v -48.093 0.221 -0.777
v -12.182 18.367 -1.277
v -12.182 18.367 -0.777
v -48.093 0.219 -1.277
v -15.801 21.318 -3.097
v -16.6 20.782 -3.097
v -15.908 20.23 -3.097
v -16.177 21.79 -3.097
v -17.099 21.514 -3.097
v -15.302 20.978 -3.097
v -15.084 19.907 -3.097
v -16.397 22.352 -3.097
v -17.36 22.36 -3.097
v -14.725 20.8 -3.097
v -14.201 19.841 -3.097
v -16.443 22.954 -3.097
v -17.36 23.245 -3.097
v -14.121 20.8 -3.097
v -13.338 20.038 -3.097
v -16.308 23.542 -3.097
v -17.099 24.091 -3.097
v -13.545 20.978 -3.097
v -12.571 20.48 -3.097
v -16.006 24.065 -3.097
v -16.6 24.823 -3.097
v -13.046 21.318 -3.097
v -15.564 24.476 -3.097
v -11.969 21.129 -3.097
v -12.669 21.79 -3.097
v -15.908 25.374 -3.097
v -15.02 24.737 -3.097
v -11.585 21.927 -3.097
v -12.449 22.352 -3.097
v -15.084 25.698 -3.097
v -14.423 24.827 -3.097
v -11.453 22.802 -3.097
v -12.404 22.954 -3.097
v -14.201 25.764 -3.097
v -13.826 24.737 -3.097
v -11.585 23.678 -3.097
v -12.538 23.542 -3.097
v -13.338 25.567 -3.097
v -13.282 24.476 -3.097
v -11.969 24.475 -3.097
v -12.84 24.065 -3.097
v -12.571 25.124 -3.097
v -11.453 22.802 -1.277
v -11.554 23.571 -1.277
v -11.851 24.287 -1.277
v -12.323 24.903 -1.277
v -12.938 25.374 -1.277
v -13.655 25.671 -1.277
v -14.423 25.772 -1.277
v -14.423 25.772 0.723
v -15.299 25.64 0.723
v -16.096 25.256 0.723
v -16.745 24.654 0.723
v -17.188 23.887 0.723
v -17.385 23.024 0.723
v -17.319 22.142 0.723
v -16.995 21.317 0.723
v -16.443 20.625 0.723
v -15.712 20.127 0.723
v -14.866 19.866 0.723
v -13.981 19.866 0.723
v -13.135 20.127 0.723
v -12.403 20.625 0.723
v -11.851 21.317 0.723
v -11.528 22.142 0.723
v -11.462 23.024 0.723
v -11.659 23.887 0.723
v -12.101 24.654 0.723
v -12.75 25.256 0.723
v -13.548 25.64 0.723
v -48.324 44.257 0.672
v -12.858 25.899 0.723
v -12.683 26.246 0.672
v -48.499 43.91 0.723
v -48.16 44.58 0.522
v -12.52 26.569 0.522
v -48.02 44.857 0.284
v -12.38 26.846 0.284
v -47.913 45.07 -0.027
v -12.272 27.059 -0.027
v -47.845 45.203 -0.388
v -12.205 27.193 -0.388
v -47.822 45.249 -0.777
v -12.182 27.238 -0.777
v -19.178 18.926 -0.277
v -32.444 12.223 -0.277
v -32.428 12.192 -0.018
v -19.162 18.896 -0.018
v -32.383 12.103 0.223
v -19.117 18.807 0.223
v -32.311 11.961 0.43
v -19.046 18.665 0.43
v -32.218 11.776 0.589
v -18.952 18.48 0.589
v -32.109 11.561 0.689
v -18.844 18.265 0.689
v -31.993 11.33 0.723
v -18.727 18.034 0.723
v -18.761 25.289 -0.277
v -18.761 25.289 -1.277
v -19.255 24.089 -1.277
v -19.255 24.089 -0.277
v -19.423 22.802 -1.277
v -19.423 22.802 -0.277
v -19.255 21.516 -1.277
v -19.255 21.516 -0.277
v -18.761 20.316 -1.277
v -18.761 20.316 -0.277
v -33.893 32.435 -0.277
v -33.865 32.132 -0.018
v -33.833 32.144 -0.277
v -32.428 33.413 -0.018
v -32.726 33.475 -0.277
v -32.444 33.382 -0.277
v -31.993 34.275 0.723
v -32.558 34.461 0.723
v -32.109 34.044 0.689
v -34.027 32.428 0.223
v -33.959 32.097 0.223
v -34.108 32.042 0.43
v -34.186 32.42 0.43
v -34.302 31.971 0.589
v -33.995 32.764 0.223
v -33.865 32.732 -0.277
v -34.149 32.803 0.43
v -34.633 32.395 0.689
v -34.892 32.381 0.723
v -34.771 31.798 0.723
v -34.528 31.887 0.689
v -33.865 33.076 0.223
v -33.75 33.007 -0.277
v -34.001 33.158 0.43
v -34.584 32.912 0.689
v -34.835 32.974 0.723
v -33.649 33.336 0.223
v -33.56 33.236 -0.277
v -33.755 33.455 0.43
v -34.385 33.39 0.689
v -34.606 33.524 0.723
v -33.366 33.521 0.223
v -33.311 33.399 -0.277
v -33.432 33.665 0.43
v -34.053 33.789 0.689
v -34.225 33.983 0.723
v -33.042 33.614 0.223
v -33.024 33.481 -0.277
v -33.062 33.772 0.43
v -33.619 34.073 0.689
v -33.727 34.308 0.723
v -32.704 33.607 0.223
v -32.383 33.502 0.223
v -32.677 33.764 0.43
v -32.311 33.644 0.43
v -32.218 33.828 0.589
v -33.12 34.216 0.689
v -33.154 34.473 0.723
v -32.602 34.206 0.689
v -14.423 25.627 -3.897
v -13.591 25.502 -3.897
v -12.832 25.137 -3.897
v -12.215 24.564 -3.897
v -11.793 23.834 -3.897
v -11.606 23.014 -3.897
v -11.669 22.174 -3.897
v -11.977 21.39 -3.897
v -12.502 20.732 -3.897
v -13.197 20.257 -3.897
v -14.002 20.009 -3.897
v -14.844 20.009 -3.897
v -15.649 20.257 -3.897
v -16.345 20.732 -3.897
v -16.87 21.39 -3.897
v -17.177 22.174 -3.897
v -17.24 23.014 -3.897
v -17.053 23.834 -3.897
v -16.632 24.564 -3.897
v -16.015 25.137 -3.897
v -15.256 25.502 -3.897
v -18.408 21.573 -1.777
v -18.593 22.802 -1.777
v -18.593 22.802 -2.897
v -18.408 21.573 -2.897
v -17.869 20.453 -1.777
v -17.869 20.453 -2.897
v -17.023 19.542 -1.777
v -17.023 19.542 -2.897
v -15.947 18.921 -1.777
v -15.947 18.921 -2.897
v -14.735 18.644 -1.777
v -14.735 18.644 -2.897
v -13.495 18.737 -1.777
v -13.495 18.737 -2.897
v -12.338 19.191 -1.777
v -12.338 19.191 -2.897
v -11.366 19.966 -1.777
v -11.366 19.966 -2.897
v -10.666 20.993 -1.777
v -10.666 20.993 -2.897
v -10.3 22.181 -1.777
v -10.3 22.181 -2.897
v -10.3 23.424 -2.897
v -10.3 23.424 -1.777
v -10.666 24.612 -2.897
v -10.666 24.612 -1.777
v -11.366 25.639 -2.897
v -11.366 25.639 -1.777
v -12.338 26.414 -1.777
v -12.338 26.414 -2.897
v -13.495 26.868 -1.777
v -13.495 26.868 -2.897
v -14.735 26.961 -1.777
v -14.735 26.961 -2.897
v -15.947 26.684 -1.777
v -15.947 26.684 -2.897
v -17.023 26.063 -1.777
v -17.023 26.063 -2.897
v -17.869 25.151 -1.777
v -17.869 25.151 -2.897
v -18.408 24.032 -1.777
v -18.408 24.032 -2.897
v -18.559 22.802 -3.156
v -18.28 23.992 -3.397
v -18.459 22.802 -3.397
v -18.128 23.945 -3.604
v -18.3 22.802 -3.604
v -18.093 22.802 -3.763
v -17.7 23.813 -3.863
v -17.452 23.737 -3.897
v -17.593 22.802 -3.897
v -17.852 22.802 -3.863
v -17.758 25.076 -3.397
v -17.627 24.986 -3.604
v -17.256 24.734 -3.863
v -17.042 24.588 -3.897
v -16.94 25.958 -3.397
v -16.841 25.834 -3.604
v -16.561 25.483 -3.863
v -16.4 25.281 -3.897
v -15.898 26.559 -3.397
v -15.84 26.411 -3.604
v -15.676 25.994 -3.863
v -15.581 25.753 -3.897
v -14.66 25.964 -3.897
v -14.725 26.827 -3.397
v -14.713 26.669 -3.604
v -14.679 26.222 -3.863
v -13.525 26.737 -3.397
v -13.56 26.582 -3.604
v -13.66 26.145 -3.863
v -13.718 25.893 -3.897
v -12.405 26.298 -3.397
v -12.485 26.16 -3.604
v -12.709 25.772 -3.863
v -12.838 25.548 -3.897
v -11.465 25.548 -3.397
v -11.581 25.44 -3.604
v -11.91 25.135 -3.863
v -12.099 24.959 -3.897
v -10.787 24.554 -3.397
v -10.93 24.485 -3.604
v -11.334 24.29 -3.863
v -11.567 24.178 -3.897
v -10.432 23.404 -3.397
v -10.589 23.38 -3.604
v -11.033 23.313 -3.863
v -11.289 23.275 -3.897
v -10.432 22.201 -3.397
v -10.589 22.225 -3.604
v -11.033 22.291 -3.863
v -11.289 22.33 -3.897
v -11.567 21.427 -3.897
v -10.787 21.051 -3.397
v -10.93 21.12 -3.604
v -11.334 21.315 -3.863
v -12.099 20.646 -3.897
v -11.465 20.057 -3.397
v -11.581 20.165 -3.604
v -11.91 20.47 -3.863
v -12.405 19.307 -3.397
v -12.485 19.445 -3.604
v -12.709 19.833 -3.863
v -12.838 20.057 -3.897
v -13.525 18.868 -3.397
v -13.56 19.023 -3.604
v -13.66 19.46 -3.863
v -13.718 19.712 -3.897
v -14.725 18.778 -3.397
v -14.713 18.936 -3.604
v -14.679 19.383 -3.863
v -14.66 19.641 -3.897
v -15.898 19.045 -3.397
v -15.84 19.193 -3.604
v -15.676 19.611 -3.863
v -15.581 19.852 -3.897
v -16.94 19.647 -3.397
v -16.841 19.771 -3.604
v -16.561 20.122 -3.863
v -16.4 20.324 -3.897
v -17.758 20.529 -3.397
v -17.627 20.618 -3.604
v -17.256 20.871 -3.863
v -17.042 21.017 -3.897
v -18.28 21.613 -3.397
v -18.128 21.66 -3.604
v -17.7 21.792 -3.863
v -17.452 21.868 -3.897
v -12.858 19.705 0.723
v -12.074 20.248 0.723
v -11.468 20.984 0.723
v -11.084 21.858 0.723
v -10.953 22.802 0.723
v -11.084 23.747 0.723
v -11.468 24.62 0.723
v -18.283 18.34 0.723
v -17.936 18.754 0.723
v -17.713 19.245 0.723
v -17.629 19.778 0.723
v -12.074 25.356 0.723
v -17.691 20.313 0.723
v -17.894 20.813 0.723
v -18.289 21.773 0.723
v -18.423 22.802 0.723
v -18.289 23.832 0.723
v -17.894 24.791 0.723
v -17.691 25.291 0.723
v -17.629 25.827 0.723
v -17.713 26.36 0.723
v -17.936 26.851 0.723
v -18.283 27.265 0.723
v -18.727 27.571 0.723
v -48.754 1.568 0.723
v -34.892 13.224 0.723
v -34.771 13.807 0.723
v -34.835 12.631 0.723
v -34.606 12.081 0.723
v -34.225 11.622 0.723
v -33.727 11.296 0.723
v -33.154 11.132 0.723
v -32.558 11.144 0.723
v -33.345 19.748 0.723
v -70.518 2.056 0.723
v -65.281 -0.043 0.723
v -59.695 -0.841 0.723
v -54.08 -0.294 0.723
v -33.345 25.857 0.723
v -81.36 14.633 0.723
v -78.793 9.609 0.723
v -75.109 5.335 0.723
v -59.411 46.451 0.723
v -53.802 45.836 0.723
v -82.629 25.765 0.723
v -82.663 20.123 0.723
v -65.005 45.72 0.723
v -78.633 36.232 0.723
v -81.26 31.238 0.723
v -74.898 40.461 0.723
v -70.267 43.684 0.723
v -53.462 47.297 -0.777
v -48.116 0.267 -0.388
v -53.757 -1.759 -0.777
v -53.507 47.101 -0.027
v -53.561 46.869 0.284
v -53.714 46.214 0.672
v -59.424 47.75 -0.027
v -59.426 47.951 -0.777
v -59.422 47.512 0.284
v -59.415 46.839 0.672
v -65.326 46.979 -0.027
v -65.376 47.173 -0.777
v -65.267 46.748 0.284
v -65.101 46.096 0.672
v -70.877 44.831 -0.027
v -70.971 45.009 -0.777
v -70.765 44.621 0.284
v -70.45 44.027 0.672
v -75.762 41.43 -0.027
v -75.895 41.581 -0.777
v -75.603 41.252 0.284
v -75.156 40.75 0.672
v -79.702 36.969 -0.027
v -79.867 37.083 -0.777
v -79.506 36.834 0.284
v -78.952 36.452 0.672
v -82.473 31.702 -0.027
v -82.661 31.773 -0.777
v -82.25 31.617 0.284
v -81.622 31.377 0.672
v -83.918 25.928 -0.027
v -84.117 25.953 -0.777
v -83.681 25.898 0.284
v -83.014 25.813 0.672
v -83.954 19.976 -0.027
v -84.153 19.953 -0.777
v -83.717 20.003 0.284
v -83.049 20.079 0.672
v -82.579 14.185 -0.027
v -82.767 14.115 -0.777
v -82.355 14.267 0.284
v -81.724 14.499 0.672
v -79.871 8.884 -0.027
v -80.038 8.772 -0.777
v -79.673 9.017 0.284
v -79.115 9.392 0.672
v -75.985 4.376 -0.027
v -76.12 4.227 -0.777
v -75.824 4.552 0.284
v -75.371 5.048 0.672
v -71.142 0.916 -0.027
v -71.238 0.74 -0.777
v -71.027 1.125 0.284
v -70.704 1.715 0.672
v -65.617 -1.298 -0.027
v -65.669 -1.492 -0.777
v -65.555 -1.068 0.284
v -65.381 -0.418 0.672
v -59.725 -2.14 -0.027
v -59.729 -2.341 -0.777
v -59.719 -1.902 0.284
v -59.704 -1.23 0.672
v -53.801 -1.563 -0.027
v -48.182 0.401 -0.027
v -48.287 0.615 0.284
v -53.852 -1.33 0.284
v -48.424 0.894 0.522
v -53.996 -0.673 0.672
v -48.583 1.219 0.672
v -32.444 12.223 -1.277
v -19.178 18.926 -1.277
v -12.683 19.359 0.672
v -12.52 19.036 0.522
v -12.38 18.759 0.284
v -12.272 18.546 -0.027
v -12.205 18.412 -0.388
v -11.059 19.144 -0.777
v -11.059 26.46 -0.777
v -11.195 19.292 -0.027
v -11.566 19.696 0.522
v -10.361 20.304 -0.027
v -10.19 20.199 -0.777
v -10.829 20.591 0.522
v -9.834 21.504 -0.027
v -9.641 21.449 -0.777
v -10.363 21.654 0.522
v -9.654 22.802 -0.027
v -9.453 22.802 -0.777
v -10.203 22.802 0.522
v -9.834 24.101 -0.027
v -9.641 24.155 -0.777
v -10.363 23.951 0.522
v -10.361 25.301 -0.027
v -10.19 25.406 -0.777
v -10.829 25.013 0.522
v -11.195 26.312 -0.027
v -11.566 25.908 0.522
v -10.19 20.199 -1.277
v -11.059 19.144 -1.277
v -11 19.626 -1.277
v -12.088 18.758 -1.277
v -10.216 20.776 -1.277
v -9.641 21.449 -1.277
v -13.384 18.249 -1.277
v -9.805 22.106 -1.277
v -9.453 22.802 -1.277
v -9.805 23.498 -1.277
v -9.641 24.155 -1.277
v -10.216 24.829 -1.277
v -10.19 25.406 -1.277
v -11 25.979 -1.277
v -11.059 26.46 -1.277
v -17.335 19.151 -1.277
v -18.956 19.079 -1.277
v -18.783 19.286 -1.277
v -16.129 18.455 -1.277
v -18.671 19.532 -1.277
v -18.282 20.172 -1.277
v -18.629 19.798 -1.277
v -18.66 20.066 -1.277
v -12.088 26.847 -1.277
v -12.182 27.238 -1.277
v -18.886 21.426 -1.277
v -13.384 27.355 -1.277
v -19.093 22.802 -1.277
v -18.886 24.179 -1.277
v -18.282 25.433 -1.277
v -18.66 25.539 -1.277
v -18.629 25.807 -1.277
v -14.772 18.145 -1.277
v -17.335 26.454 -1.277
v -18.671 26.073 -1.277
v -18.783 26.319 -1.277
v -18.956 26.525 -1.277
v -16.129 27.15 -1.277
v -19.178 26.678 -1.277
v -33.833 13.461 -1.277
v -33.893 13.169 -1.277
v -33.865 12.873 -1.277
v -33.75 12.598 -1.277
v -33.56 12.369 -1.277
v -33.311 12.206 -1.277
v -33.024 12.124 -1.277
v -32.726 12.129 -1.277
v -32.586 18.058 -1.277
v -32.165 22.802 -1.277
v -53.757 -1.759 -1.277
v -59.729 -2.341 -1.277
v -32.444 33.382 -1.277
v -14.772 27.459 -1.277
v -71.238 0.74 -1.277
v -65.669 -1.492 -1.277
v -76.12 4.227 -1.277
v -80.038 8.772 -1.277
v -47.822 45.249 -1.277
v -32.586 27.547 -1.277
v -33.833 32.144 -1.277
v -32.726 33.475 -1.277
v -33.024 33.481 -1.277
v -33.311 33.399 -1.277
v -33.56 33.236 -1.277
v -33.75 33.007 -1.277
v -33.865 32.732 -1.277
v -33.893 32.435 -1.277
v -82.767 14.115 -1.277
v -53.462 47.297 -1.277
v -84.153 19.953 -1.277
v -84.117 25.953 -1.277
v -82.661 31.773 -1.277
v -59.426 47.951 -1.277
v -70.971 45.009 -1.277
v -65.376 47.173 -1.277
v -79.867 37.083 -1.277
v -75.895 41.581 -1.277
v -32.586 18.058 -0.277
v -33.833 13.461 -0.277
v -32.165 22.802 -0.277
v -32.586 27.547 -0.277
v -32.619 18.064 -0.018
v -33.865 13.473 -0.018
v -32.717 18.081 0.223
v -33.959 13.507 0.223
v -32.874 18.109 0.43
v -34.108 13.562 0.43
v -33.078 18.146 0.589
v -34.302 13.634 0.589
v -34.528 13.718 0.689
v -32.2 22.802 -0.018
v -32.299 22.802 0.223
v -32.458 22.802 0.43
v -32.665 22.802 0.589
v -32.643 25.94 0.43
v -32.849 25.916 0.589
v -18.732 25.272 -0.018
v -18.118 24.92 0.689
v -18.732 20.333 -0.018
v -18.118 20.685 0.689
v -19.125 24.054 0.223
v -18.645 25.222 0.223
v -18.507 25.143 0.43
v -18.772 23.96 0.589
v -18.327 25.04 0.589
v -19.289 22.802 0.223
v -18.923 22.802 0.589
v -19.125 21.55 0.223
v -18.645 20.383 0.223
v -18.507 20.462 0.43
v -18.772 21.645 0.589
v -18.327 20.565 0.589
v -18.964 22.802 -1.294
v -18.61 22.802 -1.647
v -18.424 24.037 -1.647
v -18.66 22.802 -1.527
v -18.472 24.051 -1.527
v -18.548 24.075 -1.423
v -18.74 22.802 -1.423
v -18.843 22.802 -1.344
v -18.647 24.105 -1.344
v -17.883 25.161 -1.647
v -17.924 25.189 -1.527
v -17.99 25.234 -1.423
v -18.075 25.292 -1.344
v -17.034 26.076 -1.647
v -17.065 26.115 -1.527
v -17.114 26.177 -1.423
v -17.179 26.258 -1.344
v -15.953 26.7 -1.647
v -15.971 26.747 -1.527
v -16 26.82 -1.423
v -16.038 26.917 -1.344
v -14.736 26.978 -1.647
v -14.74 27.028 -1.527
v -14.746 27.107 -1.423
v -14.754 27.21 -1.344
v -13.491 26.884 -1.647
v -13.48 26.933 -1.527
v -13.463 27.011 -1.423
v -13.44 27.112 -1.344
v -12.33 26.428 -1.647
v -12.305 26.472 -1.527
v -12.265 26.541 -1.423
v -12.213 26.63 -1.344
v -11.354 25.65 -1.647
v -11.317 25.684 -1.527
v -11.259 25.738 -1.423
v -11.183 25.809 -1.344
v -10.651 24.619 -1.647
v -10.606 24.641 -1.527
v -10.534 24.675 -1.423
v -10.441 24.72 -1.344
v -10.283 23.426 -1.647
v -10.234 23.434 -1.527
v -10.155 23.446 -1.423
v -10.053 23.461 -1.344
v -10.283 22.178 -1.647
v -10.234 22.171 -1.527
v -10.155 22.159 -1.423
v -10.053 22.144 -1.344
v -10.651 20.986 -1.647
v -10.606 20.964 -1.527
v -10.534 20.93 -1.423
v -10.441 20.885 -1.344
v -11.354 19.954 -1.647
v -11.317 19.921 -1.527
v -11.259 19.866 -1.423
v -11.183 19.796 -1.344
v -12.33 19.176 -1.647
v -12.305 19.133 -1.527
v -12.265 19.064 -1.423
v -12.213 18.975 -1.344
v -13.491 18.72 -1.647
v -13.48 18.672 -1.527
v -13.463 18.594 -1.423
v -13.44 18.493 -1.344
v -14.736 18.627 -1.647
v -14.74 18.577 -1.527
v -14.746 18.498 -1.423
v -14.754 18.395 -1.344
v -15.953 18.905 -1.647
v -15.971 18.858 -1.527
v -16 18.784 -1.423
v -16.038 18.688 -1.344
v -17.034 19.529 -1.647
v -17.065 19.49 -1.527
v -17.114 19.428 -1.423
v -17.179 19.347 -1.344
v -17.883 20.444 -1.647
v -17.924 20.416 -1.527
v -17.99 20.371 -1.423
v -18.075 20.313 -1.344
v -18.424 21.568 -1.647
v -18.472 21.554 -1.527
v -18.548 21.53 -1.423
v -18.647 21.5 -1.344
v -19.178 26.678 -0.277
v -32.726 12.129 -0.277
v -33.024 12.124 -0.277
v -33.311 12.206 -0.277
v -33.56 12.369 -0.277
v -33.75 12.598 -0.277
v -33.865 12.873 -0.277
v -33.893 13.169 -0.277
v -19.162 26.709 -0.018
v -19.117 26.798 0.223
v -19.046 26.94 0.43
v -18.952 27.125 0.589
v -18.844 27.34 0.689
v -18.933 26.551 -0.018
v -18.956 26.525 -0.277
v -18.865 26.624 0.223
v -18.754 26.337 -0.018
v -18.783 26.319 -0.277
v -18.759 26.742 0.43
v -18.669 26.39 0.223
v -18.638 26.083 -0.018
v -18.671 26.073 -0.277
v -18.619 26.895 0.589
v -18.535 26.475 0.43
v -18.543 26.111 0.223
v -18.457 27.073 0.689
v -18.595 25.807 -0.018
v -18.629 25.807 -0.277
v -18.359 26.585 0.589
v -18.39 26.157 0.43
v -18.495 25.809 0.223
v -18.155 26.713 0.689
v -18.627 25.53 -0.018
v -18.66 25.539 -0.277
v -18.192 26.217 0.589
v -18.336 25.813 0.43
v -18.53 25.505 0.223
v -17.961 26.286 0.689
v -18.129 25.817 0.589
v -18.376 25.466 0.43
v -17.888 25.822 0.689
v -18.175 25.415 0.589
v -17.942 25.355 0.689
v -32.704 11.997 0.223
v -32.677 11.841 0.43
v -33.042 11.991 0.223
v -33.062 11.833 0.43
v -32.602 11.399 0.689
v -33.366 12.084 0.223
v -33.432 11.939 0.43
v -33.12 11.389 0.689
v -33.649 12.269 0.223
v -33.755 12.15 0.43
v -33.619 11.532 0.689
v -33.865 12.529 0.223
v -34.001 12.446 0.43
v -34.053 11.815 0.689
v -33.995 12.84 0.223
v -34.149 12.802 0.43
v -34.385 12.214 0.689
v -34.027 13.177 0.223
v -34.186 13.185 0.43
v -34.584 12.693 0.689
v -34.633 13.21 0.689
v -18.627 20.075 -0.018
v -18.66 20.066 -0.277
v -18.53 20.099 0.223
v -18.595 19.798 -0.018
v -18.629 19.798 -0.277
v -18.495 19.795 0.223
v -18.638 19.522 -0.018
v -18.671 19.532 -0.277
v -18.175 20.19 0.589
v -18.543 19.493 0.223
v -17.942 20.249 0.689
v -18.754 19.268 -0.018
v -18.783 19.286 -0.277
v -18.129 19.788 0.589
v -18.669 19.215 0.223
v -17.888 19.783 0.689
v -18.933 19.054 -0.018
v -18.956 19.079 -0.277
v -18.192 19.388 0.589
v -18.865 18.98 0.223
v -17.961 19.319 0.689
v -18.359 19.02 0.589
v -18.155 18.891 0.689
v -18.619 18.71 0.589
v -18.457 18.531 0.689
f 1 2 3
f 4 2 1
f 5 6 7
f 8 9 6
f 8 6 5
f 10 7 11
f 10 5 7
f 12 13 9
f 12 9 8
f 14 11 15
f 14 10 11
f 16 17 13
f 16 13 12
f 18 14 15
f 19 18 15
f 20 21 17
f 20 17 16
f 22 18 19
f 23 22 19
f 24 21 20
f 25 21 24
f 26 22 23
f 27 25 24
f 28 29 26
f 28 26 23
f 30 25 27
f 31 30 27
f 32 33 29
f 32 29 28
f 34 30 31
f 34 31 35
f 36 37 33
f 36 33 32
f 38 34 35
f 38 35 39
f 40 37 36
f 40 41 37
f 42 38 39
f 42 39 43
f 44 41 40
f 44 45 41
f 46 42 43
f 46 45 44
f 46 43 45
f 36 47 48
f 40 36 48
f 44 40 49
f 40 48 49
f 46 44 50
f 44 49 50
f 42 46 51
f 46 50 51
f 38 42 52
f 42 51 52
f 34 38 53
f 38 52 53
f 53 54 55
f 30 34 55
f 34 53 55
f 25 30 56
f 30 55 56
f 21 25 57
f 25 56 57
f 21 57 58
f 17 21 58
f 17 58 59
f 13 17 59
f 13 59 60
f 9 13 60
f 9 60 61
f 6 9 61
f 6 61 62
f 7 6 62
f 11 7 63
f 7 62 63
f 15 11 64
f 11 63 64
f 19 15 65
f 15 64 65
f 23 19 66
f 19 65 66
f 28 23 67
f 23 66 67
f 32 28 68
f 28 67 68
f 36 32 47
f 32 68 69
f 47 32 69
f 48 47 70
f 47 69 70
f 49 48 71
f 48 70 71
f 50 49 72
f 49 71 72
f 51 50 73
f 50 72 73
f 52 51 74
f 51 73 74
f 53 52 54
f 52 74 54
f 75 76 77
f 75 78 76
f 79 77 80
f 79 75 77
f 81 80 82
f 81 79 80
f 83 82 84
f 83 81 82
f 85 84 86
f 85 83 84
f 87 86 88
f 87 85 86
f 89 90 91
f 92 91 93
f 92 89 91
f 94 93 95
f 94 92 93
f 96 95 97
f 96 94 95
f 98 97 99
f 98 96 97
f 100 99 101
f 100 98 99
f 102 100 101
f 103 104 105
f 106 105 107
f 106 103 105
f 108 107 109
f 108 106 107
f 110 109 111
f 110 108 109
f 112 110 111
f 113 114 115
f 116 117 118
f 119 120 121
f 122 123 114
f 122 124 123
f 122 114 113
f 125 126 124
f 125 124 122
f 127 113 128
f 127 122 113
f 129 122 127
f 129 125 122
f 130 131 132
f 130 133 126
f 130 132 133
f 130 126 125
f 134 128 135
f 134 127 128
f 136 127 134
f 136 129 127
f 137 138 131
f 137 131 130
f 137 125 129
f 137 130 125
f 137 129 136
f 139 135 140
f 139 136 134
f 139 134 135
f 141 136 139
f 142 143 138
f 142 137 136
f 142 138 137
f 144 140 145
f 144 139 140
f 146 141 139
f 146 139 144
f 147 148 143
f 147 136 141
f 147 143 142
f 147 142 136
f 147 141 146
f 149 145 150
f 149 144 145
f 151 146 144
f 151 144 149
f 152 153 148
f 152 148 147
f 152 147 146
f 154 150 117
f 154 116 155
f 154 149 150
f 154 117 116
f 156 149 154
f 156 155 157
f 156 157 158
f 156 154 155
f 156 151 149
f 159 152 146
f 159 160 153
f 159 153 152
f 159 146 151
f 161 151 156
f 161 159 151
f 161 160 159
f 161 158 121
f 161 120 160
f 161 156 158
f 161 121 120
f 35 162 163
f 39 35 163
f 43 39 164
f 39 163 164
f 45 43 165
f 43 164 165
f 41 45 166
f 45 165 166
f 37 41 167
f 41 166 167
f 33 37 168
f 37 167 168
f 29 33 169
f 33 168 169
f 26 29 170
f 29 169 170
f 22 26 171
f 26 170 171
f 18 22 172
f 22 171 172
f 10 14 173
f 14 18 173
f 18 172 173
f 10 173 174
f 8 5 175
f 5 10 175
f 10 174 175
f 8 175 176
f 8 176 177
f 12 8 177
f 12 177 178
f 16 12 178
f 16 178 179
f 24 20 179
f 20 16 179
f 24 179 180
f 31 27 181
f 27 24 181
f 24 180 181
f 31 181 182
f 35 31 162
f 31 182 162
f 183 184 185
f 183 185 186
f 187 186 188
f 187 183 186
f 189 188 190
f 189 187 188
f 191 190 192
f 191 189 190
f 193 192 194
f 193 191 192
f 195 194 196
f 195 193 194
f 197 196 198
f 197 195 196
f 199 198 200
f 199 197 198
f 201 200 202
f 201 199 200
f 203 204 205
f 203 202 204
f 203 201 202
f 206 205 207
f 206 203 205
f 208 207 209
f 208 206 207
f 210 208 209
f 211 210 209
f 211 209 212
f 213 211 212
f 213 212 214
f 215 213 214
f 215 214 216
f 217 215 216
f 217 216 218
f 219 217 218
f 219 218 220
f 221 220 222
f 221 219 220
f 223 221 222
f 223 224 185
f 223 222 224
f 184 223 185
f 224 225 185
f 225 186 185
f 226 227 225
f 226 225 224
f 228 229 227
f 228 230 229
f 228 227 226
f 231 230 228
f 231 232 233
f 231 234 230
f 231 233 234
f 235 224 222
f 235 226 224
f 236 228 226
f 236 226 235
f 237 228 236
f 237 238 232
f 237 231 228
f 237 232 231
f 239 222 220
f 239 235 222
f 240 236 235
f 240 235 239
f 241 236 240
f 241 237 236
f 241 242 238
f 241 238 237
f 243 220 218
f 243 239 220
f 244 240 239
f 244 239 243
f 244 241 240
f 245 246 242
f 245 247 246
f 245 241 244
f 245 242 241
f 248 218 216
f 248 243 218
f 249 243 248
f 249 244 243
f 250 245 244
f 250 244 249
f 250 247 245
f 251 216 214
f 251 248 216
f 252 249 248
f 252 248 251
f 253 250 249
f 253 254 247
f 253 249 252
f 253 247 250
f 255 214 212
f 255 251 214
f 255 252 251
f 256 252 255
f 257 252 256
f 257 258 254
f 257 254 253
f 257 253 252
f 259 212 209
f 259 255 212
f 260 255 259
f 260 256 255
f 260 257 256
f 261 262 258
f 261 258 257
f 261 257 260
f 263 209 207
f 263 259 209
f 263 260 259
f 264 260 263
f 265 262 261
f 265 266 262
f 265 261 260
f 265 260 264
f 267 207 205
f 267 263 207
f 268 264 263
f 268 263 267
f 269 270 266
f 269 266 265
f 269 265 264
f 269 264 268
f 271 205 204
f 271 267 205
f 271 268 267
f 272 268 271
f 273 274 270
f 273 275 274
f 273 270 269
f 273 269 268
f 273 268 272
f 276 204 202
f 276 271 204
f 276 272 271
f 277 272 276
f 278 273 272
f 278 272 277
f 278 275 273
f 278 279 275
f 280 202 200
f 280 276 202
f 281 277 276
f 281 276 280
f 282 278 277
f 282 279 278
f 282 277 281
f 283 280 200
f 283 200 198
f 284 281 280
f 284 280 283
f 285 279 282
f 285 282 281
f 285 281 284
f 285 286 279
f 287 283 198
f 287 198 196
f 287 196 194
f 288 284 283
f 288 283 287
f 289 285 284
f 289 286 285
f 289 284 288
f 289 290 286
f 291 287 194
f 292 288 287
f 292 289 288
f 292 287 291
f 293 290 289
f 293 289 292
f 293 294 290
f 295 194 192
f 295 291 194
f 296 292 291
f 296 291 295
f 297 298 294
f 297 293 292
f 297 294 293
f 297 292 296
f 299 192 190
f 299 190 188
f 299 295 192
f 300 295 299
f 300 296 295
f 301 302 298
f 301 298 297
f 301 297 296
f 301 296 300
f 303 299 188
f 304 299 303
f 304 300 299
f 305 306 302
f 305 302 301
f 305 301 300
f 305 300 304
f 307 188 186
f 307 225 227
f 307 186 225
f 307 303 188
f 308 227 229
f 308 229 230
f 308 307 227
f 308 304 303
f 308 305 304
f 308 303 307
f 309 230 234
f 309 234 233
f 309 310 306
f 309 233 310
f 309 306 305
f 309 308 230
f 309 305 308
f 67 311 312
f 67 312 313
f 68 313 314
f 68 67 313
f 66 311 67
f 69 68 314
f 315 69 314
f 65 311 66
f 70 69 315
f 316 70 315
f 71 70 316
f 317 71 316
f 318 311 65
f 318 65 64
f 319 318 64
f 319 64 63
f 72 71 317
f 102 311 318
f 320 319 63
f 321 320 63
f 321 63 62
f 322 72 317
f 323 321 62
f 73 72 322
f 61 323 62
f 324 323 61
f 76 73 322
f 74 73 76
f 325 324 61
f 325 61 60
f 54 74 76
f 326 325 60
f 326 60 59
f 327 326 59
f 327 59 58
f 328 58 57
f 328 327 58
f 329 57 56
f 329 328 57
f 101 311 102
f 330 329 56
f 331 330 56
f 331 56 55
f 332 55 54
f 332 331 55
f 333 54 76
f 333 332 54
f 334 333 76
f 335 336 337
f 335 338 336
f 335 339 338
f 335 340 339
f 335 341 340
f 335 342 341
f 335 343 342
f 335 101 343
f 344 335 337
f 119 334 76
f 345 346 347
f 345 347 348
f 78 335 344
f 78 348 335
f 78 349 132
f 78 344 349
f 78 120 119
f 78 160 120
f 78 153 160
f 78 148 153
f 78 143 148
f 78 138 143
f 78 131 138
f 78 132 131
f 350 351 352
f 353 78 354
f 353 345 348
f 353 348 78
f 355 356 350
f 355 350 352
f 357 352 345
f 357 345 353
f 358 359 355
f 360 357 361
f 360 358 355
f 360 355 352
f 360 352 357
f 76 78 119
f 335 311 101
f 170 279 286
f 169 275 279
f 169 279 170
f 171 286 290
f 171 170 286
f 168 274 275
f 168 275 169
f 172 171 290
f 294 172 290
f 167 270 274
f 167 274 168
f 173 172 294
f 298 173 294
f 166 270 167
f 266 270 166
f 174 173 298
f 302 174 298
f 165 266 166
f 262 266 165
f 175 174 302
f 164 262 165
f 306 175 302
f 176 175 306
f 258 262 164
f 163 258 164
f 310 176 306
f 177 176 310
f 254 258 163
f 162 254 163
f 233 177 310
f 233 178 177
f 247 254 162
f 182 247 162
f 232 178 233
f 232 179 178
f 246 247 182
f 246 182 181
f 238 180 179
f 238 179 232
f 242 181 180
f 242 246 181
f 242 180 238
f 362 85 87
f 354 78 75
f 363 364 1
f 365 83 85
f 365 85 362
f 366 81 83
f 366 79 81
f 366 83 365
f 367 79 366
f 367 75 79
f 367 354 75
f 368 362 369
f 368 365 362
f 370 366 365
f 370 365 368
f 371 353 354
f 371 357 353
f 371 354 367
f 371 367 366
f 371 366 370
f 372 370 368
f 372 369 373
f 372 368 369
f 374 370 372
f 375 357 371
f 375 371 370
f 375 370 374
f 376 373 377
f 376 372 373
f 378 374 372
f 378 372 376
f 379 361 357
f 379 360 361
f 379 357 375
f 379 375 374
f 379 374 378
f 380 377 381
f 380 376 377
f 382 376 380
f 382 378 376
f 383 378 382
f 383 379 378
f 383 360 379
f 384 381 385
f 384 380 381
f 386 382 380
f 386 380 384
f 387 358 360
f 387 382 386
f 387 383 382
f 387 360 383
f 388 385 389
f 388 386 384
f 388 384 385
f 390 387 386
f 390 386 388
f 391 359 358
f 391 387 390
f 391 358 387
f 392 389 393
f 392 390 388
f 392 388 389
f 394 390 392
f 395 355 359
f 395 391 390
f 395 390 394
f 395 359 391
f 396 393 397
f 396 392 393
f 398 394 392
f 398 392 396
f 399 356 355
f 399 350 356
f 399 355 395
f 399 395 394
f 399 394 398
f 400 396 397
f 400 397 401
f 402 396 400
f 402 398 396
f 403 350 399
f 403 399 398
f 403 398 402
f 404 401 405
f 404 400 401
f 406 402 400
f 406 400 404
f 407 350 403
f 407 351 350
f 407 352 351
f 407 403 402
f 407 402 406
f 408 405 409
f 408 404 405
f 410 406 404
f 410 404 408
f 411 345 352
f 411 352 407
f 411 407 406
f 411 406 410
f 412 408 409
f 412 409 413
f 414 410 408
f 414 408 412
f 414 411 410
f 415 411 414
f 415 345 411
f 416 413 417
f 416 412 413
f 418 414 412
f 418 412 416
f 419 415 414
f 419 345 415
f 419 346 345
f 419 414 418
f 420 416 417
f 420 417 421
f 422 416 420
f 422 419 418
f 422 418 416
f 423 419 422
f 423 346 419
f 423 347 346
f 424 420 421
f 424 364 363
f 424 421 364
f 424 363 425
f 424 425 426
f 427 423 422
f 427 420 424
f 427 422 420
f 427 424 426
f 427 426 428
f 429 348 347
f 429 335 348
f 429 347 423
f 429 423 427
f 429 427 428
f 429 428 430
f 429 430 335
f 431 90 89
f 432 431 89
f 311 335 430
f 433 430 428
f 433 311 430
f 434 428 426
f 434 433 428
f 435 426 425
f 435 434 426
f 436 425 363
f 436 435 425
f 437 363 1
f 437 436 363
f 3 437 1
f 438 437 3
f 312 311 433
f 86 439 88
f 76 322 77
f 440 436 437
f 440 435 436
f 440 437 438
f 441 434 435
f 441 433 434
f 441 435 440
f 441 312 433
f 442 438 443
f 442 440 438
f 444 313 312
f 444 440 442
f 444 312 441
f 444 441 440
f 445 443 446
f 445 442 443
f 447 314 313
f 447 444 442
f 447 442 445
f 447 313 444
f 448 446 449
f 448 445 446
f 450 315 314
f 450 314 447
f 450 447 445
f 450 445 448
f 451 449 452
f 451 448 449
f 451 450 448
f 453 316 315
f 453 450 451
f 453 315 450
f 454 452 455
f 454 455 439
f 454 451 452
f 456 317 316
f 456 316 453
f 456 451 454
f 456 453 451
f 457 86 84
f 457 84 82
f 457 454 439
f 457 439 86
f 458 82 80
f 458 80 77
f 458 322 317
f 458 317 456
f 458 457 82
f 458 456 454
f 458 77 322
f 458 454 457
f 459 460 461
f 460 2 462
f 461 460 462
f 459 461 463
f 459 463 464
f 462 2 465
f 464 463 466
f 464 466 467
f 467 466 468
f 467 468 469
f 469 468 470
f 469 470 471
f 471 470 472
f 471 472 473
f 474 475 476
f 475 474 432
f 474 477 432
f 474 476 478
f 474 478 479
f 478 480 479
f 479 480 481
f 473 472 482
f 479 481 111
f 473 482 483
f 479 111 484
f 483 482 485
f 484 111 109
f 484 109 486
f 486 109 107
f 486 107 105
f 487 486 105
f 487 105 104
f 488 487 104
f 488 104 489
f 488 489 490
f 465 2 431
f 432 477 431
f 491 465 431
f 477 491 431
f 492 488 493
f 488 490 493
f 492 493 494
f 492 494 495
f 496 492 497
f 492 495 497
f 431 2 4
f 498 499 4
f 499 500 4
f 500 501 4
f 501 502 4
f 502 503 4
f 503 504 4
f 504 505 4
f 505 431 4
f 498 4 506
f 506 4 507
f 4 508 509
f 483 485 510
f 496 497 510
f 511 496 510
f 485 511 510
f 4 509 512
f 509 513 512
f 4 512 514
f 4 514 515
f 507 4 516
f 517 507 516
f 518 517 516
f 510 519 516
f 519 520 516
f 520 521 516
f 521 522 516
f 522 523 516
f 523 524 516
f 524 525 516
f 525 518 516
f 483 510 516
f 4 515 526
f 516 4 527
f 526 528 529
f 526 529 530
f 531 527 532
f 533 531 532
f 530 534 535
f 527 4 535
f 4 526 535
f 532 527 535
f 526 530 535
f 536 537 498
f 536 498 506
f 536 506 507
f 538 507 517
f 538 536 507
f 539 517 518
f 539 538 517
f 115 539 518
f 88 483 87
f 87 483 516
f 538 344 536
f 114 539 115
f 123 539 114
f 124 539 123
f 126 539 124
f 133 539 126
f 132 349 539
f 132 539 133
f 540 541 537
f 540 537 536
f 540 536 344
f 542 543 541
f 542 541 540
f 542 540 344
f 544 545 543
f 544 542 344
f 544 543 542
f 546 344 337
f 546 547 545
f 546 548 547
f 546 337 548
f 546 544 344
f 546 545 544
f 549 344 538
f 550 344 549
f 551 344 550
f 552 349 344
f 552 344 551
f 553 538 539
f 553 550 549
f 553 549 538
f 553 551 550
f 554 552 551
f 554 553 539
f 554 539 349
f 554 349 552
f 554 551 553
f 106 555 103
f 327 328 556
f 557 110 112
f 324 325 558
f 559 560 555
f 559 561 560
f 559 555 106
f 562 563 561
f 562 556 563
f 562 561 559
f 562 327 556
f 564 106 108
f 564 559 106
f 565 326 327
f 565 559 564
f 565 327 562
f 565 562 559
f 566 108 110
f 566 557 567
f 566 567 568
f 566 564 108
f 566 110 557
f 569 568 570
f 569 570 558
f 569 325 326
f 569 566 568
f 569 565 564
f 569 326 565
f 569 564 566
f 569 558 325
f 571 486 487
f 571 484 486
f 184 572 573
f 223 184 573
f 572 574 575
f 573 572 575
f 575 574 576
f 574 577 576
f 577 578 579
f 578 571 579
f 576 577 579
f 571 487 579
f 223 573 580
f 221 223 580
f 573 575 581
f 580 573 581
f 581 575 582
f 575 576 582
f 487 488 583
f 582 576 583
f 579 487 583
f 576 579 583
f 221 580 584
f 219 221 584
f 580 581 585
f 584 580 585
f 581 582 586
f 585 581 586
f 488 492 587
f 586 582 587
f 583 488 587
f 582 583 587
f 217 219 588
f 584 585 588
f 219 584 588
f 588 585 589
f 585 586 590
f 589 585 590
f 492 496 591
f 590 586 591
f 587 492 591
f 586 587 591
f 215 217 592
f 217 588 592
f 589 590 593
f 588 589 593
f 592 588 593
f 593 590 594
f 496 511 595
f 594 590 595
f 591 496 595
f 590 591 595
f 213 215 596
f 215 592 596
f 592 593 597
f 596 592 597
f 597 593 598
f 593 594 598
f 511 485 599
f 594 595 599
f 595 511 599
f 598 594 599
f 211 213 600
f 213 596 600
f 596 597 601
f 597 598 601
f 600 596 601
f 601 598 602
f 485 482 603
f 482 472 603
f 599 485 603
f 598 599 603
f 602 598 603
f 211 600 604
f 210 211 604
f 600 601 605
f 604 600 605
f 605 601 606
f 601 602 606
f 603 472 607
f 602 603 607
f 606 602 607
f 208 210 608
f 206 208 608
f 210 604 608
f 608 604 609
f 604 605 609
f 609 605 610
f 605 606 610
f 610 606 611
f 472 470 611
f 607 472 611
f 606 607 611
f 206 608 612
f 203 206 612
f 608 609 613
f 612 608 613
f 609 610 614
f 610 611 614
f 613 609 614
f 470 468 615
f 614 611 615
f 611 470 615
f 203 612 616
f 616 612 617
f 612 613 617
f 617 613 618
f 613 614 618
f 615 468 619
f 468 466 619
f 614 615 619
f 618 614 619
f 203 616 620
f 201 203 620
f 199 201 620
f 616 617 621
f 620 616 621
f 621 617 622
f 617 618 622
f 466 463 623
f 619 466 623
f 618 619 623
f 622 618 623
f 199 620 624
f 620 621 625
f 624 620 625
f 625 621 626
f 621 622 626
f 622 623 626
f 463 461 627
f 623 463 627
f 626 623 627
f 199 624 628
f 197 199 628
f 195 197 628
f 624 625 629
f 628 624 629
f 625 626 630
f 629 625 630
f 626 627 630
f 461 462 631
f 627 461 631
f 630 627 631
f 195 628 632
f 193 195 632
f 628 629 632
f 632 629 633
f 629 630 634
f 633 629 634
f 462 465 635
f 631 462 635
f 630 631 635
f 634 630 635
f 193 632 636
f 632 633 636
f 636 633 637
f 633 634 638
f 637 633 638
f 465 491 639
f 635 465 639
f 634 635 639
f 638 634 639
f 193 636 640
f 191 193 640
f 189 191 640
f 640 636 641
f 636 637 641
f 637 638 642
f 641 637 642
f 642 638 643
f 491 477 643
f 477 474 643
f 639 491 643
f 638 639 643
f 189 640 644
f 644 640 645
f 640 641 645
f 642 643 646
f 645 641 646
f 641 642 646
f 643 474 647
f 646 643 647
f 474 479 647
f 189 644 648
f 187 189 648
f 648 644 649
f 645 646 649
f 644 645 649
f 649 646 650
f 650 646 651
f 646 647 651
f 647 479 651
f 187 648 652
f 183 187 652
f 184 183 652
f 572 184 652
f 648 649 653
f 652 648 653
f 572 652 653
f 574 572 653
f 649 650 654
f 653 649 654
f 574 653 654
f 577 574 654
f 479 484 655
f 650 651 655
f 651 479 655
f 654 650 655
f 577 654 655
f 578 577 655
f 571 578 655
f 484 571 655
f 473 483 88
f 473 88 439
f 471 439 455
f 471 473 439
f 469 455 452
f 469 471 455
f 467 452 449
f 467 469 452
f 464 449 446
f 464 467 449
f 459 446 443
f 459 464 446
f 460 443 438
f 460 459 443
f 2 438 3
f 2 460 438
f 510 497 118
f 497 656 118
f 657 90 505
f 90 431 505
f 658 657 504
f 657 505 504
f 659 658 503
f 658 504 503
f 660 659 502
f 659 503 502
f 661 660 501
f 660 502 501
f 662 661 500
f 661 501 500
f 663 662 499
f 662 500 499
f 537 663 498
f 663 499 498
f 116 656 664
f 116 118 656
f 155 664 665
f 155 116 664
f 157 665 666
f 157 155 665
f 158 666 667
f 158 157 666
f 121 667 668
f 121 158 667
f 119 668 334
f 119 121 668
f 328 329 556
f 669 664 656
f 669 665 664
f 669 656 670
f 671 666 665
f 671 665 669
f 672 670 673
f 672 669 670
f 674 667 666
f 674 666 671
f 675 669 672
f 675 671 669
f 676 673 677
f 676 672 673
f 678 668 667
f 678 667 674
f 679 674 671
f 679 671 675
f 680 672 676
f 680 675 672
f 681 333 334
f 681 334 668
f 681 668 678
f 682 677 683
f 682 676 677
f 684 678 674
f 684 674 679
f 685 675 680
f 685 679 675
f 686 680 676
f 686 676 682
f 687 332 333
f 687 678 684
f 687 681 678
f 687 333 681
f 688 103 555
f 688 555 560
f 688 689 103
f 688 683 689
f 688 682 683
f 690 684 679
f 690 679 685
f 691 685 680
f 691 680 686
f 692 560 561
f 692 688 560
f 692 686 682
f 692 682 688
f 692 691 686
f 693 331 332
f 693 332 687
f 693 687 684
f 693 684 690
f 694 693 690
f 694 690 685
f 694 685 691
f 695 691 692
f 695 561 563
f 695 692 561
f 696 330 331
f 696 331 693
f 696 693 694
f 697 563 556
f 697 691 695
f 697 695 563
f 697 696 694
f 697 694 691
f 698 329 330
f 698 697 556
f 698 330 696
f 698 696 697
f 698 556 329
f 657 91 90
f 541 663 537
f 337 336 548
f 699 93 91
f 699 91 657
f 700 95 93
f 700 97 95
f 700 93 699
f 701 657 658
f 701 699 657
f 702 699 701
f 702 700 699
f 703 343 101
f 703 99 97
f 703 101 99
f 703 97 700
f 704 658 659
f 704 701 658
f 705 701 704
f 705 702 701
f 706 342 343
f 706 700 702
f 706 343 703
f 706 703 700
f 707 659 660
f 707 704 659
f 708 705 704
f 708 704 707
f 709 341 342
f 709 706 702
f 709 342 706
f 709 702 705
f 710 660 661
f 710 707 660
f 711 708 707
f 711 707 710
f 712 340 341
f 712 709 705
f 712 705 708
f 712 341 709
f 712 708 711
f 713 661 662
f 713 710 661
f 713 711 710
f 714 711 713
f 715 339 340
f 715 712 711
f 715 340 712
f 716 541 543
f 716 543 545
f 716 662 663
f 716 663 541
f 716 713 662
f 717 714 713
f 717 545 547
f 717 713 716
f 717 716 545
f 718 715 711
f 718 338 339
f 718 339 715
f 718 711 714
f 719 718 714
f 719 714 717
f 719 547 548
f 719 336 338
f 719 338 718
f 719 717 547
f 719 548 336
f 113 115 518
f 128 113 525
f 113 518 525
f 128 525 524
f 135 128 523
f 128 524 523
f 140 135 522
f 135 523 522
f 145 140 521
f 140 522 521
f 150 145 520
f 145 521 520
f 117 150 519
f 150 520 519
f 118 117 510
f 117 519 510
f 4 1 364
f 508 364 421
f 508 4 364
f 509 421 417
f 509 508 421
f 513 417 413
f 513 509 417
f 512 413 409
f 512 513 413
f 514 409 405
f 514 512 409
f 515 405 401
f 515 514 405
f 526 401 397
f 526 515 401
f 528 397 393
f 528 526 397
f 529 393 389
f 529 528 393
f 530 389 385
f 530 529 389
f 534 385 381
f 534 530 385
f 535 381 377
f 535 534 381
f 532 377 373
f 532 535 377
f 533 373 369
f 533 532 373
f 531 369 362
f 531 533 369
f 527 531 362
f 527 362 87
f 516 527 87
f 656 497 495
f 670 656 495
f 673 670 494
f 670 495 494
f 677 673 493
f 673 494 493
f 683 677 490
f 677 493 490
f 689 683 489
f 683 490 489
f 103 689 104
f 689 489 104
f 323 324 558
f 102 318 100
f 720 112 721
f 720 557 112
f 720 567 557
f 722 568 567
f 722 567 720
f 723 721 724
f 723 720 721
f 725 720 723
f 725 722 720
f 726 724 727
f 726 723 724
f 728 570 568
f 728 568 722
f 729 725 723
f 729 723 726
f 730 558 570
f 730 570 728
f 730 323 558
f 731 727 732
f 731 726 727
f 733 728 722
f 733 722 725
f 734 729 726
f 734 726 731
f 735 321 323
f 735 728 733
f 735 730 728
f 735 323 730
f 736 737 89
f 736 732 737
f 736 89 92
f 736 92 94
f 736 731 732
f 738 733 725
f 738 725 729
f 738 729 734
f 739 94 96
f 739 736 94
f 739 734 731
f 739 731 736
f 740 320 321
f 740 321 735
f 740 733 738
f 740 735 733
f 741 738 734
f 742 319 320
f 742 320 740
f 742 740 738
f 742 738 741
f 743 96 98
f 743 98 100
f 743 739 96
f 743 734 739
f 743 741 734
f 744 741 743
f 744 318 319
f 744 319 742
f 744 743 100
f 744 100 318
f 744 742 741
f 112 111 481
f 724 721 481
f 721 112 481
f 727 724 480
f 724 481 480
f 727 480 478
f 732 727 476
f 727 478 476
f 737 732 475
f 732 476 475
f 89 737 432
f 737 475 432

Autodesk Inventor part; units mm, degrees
ref_plane "YZ Plane" through (0, 0, 0) normal (1, 0, 0) x (0, 1, 0)
ref_plane "XZ Plane" through (0, 0, 0) normal (0, 1, 0) x (-1, 0, 0)
ref_plane "XY Plane" through (0, 0, 0) normal (0, 0, 1) x (1, 0, 0)
ref_plane "Work Plane1" through (0, 0, 0) normal (0, 0, -1) x (-1, 0, 0)
ref_plane "Work Plane3" through (-59.1654, 22.8024, -1.2767) normal (0, 0, 1) x (0, 1, 0)
sketch "Sketch4" plane through (-59.1654, 22.8024, -1.2767) normal (0, 0, 1) x (0, 1, 0)
  line L0 (0, 0.2578) -> (0, -48.4285) construction
  line L1 (-4.3051, -44.7422) -> (4.9106, -44.7422) construction
  circle A0 centre (0, -44.7422) radius 2.97
  circle A1 centre (0, 0) radius 25.1499 construction
  arc A2 (-4.4358, -46.9838) -> (4.4358, -46.9838) centre (0, -44.7422) ccw
  line L2 (0, -55.7616) -> (-22.5832, -11.0728)
  line L3 (0, -55.7616) -> (22.4465, -11.3432)
  arc A3 (22.4465, -11.3432) -> (-22.4465, -11.3432) centre (0, 0) ccw
  line L4 (0, 0) -> (0, -25.1499) construction
  line L5 (0, -41.7722) -> (0, -73.1545) construction
  point P0 (-22.8024, -59.1654)
  dimension "d9" = 5.94
  dimension "d8" = 45
  dimension "d10" = 2
extrude "Extrusion2" add sketch "Sketch4" along normal blind 2 contours L2 A3 L3 A2
fillet "Fillet2" radius 1.5 4 edges at (-9.4532, 22.8024, 0.7233) (-30.0019, 36.2436, 0.7233) (-84.3153, 22.8024, 0.7233) (-30.0019, 9.3612, 0.7233)
sketch "Sketch5" plane through (-59.1654, 22.8024, 0.7233) normal (0, 0, 1) x (1, 0, 0)
  line L0 (41.0298, 3.3493) -> (24.2777, 11.8149)
  line L1 (24.2777, -11.8149) -> (41.0298, -3.3493)
  line L2 (11.3432, -22.4465) -> (46.9838, -4.4358) projected
  line L3 (46.9838, 4.4358) -> (11.3432, 22.4465) projected
  arc A0 (46.9838, -4.4358) -> (46.9838, 4.4358) centre (44.7422, 0) ccw projected
  circle A1 centre (44.7422, 0) radius 2.97 projected
  arc A2 (46.3073, -3.097) -> (46.3073, 3.097) centre (44.7422, 0) ccw projected
  line L4 (10.6667, 21.1078) -> (46.3073, 3.097) projected
  arc A3 (10.6667, 21.1078) -> (10.6667, -21.1078) centre (0, 0) ccw projected
  line L5 (46.3073, -3.097) -> (10.6667, -21.1078) projected
  line L6 (-0.2578, 0) -> (48.4285, 0) construction
  arc A4 (24.2777, -11.8149) -> (24.2777, 11.8149) centre (0, 0) ccw
  arc A5 (41.0298, 3.3493) -> (41.0298, -3.3493) centre (44.7422, 0) ccw
  line L7 (48.7042, -0.0038) -> (-50.8727, 0.004) construction
  point P0 (59.1654, -22.8024)
  point P1 (39.7422, -4)
  point P2 (39.7422, 4)
  point P3 (26.5473, 10.668)
  point P4 (26.5473, -10.668)
  dimension "d25" = 27
  dimension "d27" = 5
extrude "Extrusion3" cut sketch "Sketch5" against normal through all contours A5 L1 A4 L0
fillet "Fillet4" radius 1 4 edges at (-18.1356, 26.1517, -0.2767) (-18.1356, 19.4531, -0.2767) (-34.8877, 34.6173, -0.2767) (-34.8877, 10.9875, -0.2767)
fillet "Fillet5" radius 1 8 edges at (-33.56, 12.3687, 0.7233) (-32.1654, 22.8024, 0.7233) (-33.56, 33.2361, 0.7233) (-25.8107, 30.0303, 0.7233) (-18.6709, 26.073, 0.7233) (-19.4232, 22.8024, 0.7233) (-18.6709, 19.5318, 0.7233) (-25.8107, 15.5745, 0.7233)
sketch "Sketch6" plane through (-59.1654, 22.8024, -1.2767) normal (0, 0, -1) x (-1, 0, 0)
  line L0 (-47.2622, 0) -> (-42.2222, 0) construction
  circle A0 centre (-44.7422, 0) radius 4.17
  arc A1 (-46.9838, 4.4358) -> (-46.9838, -4.4358) centre (-44.7422, 0) ccw construction
  point P0 (-59.1654, -22.8024)
  dimension "d30" = 0.8
extrude "Extrusion4" add sketch "Sketch6" along normal blind 2.62
fillet "Fillet6" radius 1 1 edges at (-10.2532, 22.8024, -3.8967)
sketch "Sketch7" plane through (-14.4232, 22.8024, -1.2767) normal (0, 0, 1) x (1, 0, 0)
  circle A0 centre (0, 0) radius 2.97 projected
  point P0 (14.4232, -22.8024)
extrude "Extrusion5" cut sketch "Sketch7" against normal blind 1.82
sketch "Sketch8" plane through (-14.4232, 22.8024, -3.8967) normal (0, 0, -1) x (-1, 0, 0)
  circle A0 centre (0, 0) radius 1.3 projected
  point P0 (-14.4232, -22.8024)
hole "Hole1" at (-14.4232, 22.8024, -3.8967) direction (0, 0, 1) diameter 2.86 depth 1.82 countersink diameter 5.65 countersink angle 90
fillet "Fillet7" radius 0.5 1 edges at (-10.2532, 22.8024, -1.2767)
properties part number "trapdoor_servo" material "PET Plastic"
